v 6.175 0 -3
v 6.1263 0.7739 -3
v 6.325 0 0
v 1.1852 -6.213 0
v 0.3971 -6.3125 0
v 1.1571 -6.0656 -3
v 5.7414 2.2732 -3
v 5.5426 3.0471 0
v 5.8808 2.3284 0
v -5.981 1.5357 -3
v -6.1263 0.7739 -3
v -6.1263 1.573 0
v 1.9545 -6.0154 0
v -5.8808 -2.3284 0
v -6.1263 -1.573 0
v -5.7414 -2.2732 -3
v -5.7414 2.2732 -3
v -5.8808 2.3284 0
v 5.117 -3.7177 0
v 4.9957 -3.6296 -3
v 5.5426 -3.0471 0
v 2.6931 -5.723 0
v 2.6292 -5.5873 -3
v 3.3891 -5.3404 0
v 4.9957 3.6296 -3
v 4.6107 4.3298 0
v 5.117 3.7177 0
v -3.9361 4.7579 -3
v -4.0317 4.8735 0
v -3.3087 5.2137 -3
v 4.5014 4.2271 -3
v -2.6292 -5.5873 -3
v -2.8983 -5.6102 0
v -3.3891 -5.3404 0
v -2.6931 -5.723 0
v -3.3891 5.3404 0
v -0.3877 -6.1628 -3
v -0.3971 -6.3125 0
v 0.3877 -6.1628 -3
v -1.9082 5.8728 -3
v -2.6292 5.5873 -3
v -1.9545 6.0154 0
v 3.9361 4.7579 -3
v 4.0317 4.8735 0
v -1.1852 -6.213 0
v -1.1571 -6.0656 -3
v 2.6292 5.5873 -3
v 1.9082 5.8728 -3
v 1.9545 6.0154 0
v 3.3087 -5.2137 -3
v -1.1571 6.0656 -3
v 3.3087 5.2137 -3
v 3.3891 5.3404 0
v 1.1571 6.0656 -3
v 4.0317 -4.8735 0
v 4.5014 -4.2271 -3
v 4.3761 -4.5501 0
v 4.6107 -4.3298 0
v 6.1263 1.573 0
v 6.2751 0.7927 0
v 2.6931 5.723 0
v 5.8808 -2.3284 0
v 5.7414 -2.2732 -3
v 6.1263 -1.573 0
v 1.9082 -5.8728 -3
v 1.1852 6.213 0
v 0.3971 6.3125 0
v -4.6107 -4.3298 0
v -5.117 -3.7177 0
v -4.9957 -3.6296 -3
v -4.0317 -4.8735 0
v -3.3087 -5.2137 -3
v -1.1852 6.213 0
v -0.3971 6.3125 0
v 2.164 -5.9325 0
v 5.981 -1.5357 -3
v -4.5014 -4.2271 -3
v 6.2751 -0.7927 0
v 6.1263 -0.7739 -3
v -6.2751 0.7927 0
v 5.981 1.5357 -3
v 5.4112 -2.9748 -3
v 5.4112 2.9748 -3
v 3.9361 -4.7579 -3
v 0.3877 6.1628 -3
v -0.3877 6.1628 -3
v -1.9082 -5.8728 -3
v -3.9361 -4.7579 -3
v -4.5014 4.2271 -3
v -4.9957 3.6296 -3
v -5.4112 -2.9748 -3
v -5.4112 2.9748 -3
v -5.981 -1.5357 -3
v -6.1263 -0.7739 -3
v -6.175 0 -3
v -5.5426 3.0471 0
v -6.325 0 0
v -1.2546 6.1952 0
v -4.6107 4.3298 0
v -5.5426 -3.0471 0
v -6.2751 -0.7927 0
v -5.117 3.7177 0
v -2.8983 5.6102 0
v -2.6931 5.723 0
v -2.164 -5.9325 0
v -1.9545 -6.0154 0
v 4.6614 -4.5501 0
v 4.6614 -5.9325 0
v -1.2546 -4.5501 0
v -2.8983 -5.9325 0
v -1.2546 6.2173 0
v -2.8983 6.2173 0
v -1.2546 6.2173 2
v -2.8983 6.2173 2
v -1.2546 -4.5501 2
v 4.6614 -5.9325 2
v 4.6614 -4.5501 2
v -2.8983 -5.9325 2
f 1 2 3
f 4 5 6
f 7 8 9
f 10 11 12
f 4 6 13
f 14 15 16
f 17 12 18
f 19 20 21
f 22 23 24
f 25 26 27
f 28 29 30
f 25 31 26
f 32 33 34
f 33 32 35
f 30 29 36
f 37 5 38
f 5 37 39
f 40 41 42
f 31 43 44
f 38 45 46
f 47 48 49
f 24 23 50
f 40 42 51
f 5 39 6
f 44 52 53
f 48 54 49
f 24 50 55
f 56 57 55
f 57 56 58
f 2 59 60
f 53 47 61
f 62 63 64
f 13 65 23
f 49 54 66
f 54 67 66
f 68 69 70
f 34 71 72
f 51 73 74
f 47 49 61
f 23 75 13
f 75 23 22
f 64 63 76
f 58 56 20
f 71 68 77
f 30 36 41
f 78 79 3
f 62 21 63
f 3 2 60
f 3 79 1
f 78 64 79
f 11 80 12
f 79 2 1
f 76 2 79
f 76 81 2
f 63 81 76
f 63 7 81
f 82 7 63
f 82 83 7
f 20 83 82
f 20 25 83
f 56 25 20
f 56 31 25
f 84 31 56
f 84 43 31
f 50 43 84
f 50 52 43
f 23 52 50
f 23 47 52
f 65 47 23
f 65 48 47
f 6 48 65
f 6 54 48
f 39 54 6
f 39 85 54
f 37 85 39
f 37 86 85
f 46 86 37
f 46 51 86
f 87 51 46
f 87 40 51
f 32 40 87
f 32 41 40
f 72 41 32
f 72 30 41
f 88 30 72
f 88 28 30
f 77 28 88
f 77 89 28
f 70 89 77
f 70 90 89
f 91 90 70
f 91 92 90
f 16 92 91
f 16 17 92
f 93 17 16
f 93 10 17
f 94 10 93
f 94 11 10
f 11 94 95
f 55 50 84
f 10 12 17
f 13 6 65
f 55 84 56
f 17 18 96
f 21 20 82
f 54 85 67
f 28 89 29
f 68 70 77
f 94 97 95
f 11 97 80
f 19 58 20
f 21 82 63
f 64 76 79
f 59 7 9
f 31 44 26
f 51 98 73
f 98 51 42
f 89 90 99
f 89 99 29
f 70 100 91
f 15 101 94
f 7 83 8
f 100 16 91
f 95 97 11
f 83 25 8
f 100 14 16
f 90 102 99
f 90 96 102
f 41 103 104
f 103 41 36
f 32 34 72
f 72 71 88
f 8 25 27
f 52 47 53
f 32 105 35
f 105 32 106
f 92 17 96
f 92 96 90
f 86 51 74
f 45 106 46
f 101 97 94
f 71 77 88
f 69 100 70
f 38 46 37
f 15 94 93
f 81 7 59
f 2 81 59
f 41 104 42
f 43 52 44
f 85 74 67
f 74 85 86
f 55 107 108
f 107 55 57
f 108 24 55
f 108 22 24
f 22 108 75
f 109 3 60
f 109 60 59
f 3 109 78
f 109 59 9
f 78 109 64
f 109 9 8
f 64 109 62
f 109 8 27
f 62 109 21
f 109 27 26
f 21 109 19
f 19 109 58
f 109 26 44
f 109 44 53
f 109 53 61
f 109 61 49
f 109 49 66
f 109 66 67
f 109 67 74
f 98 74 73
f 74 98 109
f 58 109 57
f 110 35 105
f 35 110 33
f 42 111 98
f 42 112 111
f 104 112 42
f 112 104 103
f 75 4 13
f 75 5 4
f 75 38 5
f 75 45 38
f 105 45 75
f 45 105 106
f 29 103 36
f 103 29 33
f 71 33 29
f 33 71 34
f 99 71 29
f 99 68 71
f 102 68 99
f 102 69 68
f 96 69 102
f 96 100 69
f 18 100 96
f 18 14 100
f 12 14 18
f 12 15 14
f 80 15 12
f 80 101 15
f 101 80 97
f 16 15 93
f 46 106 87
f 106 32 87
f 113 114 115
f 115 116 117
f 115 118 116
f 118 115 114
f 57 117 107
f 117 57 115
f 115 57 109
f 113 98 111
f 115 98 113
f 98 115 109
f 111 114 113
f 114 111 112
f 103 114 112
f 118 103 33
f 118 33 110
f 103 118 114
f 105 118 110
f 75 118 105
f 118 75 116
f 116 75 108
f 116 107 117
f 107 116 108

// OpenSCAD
$fn = 50;

difference() {
	union() {
		translate(v = [0, 0, -3.0]) {
			cylinder(h = 3, r1 = 6.175, r2 = 6.325);
		}
		linear_extrude(height = 2) {
			text(font = "Impact", halign = "center", size = 12, text = "L", valign = "center");
		}
	}
	union();
}
